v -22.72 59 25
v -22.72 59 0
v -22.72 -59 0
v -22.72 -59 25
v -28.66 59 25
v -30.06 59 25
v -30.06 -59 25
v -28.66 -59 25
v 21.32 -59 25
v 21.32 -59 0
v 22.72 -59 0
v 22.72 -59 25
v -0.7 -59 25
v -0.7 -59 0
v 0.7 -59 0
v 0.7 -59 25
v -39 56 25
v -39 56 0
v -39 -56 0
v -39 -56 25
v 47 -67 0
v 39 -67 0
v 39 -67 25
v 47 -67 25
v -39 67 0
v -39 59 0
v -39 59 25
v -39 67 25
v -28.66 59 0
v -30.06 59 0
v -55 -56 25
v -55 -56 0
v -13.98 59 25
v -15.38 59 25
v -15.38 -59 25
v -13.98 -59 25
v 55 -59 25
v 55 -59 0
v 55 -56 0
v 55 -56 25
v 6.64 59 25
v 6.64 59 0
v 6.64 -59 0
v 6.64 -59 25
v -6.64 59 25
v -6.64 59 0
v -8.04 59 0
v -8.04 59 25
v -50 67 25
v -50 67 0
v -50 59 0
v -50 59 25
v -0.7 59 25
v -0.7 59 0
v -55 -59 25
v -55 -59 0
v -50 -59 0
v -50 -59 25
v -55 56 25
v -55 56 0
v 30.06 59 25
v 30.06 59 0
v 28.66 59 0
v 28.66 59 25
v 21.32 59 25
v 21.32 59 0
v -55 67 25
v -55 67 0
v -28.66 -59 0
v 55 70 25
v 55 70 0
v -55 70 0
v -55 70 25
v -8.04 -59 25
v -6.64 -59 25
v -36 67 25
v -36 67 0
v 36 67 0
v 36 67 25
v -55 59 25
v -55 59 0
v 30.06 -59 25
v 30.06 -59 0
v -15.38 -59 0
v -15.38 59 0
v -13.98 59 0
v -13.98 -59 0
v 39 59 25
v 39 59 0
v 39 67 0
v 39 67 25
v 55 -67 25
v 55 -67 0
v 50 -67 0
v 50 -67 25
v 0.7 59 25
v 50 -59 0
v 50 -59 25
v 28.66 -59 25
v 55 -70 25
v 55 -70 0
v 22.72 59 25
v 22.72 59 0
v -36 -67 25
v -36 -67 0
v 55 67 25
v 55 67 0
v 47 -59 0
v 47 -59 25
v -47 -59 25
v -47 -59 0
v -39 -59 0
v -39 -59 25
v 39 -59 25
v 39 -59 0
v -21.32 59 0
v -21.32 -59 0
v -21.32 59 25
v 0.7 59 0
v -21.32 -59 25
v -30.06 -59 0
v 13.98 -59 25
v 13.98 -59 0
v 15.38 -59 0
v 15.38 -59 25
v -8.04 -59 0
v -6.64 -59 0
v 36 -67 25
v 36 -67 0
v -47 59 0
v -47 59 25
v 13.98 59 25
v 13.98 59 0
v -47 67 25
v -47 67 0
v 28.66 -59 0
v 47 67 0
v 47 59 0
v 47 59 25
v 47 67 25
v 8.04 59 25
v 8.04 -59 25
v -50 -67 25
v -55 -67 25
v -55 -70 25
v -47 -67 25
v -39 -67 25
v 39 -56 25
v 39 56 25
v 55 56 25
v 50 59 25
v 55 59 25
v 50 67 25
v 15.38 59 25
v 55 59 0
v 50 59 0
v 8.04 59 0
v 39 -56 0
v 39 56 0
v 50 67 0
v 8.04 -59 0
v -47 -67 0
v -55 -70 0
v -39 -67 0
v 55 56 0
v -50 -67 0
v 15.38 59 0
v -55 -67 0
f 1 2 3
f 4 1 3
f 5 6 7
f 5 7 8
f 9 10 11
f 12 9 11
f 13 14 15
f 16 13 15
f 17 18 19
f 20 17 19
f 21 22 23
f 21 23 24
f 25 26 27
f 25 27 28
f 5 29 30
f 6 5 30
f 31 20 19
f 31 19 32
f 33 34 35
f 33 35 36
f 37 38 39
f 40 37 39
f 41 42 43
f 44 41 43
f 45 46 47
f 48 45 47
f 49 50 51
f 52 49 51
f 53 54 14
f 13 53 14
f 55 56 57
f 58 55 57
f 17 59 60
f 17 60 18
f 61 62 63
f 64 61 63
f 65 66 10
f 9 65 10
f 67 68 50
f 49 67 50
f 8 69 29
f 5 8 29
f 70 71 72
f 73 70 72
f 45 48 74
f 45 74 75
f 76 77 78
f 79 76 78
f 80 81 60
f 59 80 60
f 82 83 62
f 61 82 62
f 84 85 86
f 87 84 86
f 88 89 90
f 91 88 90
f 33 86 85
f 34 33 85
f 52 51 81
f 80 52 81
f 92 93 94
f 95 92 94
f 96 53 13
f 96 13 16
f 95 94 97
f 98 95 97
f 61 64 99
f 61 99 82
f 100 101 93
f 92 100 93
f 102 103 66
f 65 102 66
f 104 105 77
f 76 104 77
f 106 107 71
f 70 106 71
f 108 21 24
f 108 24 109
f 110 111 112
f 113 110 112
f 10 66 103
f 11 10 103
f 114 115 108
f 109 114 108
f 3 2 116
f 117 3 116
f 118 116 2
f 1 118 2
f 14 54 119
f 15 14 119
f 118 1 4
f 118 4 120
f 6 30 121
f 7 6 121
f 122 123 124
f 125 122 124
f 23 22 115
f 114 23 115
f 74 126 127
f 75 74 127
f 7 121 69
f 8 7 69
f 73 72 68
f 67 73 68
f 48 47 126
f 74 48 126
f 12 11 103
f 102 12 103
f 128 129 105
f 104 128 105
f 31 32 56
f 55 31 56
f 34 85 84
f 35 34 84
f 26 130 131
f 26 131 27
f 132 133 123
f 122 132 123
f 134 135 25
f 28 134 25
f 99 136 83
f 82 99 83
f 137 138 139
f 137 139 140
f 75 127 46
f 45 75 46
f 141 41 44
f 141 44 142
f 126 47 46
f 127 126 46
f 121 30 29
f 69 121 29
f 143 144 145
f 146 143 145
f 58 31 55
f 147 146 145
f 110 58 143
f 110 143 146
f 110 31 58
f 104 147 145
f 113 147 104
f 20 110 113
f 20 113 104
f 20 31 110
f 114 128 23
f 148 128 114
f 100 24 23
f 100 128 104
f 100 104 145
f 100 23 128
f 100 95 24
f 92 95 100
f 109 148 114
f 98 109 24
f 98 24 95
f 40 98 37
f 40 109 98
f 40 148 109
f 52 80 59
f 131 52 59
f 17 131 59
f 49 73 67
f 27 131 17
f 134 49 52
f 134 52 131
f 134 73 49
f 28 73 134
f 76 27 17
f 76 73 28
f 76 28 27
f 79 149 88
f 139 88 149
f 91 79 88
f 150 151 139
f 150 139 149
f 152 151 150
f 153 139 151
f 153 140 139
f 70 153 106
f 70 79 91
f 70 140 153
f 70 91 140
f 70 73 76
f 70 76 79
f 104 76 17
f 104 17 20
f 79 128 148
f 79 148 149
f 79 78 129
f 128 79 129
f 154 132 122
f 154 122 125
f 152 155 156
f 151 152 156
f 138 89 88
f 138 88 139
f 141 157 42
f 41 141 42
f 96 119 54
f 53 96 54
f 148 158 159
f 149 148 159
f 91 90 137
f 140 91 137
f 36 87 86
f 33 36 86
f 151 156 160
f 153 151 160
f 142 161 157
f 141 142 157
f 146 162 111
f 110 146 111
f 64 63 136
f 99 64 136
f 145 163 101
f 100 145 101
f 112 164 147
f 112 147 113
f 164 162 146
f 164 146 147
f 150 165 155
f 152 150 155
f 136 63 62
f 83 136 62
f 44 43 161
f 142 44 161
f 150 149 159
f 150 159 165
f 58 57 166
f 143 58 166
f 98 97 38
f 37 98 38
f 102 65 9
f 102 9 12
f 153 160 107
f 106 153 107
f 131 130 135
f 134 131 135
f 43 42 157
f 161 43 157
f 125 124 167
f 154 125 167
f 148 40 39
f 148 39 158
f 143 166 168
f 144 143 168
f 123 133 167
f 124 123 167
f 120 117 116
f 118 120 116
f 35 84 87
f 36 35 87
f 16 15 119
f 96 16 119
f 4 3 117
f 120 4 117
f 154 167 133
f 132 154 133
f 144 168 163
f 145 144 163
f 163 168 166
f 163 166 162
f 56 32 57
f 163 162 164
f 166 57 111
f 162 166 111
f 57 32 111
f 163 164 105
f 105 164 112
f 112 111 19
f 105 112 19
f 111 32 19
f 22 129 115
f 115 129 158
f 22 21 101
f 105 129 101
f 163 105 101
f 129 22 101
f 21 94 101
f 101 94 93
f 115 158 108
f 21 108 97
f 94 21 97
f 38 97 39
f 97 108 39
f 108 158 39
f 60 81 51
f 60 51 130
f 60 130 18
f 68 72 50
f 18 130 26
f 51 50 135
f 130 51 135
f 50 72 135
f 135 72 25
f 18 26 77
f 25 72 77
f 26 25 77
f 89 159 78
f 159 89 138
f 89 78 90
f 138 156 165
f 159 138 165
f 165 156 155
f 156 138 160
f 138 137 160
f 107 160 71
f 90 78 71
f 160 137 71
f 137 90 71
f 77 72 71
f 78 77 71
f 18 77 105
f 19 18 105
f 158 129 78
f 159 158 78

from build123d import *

# Parameters (mm, degrees)
F1_DEPTH = 25
F0_W     = 8
F0_H     = 8


with BuildPart() as f1:
    # F0 (on Top) → F1 (new body)
    with BuildSketch(Plane.XY):
        Polygon((22.72, 0), (22.72, 59), (21.32, 59), (21.32, 0), (21.32, -59), (22.72, -59), align=None)
    extrude(amount=F1_DEPTH)


with BuildPart() as f1b:
    # F0 (on Top) → F1, piece 2 (new body)
    with BuildSketch(Plane.XY):
        Polygon((8.04, 0), (8.04, 59), (6.64, 59), (6.64, 0), (6.64, -59), (8.04, -59), align=None)
    extrude(amount=F1_DEPTH)


with BuildPart() as f1c:
    # F0 (on Top) → F1, piece 3 (new body)
    with BuildSketch(Plane.XY):
        Polygon((0.7, 0), (0.7, 59), (-0.7, 59), (-0.7, 0), (-0.7, -59), (0.7, -59), align=None)
    extrude(amount=F1_DEPTH)


with BuildPart() as f1d:
    # F0 (on Top) → F1, piece 4 (new body)
    with BuildSketch(Plane.XY):
        Polygon((-13.98, 0), (-13.98, 59), (-15.38, 59), (-15.38, 0), (-15.38, -59), (-13.98, -59), align=None)
    extrude(amount=F1_DEPTH)


with BuildPart() as f1e:
    # F0 (on Top) → F1, piece 5 (new body)
    with BuildSketch(Plane.XY):
        Polygon((-21.32, 0), (-21.32, 59), (-22.72, 59), (-22.72, 0), (-22.72, -59), (-21.32, -59), align=None)
    extrude(amount=F1_DEPTH)


with BuildPart() as f1f:
    # F0 (on Top) → F1, piece 6 (new body)
    with BuildSketch(Plane.XY):
        Polygon((55, 70), (-55, 70), (-55, 67), (-50, 67), (-50, 59), (-55, 59), (-55, 56), (-50, 56), (-39, 56), (-39, 0), (-39, -56), (-50, -56), (-55, -56), (-55, -59), (-50, -59), (-50, -67), (-55, -67), (-55, -70), (55, -70), (55, -67), (50, -67), (50, -59), (55, -59), (55, -56), (50, -56), (39, -56), (39, 0), (39, 56), (50, 56), (55, 56), (55, 59), (50, 59), (50, 67), (55, 67), align=None)
        with Locations((-43, -63)):
            Rectangle(F0_W, F0_H, mode=Mode.SUBTRACT)
        with Locations((43, -63)):
            Rectangle(F0_W, F0_H, mode=Mode.SUBTRACT)
        with Locations((-43, 63)):
            Rectangle(F0_W, F0_H, mode=Mode.SUBTRACT)
        Polygon((-36, 0), (-36, 67), (36, 67), (36, 0), (36, -67), (-36, -67), align=None, mode=Mode.SUBTRACT)
        with Locations((43, 63)):
            Rectangle(F0_W, F0_H, mode=Mode.SUBTRACT)
    extrude(amount=F1_DEPTH)


with BuildPart() as f1g:
    # F0 (on Top) → F1, piece 7 (new body)
    with BuildSketch(Plane.XY):
        Polygon((-28.66, 59), (-30.06, 59), (-30.06, 0), (-30.06, -59), (-28.66, -59), (-28.66, 0), align=None)
    extrude(amount=F1_DEPTH)


with BuildPart() as f1h:
    # F0 (on Top) → F1, piece 8 (new body)
    with BuildSketch(Plane.XY):
        Polygon((30.06, 0), (30.06, 59), (28.66, 59), (28.66, 0), (28.66, -59), (30.06, -59), align=None)
    extrude(amount=F1_DEPTH)


with BuildPart() as f1i:
    # F0 (on Top) → F1, piece 9 (new body)
    with BuildSketch(Plane.XY):
        Polygon((15.38, 0), (15.38, 59), (13.98, 59), (13.98, 0), (13.98, -59), (15.38, -59), align=None)
    extrude(amount=F1_DEPTH)


with BuildPart() as f1j:
    # F0 (on Top) → F1, piece 10 (new body)
    with BuildSketch(Plane.XY):
        Polygon((-6.64, 0), (-6.64, 59), (-8.04, 59), (-8.04, 0), (-8.04, -59), (-6.64, -59), align=None)
    extrude(amount=F1_DEPTH)


solid = Compound([f1.part, f1b.part, f1c.part, f1d.part, f1e.part, f1f.part, f1g.part, f1h.part, f1i.part, f1j.part])
